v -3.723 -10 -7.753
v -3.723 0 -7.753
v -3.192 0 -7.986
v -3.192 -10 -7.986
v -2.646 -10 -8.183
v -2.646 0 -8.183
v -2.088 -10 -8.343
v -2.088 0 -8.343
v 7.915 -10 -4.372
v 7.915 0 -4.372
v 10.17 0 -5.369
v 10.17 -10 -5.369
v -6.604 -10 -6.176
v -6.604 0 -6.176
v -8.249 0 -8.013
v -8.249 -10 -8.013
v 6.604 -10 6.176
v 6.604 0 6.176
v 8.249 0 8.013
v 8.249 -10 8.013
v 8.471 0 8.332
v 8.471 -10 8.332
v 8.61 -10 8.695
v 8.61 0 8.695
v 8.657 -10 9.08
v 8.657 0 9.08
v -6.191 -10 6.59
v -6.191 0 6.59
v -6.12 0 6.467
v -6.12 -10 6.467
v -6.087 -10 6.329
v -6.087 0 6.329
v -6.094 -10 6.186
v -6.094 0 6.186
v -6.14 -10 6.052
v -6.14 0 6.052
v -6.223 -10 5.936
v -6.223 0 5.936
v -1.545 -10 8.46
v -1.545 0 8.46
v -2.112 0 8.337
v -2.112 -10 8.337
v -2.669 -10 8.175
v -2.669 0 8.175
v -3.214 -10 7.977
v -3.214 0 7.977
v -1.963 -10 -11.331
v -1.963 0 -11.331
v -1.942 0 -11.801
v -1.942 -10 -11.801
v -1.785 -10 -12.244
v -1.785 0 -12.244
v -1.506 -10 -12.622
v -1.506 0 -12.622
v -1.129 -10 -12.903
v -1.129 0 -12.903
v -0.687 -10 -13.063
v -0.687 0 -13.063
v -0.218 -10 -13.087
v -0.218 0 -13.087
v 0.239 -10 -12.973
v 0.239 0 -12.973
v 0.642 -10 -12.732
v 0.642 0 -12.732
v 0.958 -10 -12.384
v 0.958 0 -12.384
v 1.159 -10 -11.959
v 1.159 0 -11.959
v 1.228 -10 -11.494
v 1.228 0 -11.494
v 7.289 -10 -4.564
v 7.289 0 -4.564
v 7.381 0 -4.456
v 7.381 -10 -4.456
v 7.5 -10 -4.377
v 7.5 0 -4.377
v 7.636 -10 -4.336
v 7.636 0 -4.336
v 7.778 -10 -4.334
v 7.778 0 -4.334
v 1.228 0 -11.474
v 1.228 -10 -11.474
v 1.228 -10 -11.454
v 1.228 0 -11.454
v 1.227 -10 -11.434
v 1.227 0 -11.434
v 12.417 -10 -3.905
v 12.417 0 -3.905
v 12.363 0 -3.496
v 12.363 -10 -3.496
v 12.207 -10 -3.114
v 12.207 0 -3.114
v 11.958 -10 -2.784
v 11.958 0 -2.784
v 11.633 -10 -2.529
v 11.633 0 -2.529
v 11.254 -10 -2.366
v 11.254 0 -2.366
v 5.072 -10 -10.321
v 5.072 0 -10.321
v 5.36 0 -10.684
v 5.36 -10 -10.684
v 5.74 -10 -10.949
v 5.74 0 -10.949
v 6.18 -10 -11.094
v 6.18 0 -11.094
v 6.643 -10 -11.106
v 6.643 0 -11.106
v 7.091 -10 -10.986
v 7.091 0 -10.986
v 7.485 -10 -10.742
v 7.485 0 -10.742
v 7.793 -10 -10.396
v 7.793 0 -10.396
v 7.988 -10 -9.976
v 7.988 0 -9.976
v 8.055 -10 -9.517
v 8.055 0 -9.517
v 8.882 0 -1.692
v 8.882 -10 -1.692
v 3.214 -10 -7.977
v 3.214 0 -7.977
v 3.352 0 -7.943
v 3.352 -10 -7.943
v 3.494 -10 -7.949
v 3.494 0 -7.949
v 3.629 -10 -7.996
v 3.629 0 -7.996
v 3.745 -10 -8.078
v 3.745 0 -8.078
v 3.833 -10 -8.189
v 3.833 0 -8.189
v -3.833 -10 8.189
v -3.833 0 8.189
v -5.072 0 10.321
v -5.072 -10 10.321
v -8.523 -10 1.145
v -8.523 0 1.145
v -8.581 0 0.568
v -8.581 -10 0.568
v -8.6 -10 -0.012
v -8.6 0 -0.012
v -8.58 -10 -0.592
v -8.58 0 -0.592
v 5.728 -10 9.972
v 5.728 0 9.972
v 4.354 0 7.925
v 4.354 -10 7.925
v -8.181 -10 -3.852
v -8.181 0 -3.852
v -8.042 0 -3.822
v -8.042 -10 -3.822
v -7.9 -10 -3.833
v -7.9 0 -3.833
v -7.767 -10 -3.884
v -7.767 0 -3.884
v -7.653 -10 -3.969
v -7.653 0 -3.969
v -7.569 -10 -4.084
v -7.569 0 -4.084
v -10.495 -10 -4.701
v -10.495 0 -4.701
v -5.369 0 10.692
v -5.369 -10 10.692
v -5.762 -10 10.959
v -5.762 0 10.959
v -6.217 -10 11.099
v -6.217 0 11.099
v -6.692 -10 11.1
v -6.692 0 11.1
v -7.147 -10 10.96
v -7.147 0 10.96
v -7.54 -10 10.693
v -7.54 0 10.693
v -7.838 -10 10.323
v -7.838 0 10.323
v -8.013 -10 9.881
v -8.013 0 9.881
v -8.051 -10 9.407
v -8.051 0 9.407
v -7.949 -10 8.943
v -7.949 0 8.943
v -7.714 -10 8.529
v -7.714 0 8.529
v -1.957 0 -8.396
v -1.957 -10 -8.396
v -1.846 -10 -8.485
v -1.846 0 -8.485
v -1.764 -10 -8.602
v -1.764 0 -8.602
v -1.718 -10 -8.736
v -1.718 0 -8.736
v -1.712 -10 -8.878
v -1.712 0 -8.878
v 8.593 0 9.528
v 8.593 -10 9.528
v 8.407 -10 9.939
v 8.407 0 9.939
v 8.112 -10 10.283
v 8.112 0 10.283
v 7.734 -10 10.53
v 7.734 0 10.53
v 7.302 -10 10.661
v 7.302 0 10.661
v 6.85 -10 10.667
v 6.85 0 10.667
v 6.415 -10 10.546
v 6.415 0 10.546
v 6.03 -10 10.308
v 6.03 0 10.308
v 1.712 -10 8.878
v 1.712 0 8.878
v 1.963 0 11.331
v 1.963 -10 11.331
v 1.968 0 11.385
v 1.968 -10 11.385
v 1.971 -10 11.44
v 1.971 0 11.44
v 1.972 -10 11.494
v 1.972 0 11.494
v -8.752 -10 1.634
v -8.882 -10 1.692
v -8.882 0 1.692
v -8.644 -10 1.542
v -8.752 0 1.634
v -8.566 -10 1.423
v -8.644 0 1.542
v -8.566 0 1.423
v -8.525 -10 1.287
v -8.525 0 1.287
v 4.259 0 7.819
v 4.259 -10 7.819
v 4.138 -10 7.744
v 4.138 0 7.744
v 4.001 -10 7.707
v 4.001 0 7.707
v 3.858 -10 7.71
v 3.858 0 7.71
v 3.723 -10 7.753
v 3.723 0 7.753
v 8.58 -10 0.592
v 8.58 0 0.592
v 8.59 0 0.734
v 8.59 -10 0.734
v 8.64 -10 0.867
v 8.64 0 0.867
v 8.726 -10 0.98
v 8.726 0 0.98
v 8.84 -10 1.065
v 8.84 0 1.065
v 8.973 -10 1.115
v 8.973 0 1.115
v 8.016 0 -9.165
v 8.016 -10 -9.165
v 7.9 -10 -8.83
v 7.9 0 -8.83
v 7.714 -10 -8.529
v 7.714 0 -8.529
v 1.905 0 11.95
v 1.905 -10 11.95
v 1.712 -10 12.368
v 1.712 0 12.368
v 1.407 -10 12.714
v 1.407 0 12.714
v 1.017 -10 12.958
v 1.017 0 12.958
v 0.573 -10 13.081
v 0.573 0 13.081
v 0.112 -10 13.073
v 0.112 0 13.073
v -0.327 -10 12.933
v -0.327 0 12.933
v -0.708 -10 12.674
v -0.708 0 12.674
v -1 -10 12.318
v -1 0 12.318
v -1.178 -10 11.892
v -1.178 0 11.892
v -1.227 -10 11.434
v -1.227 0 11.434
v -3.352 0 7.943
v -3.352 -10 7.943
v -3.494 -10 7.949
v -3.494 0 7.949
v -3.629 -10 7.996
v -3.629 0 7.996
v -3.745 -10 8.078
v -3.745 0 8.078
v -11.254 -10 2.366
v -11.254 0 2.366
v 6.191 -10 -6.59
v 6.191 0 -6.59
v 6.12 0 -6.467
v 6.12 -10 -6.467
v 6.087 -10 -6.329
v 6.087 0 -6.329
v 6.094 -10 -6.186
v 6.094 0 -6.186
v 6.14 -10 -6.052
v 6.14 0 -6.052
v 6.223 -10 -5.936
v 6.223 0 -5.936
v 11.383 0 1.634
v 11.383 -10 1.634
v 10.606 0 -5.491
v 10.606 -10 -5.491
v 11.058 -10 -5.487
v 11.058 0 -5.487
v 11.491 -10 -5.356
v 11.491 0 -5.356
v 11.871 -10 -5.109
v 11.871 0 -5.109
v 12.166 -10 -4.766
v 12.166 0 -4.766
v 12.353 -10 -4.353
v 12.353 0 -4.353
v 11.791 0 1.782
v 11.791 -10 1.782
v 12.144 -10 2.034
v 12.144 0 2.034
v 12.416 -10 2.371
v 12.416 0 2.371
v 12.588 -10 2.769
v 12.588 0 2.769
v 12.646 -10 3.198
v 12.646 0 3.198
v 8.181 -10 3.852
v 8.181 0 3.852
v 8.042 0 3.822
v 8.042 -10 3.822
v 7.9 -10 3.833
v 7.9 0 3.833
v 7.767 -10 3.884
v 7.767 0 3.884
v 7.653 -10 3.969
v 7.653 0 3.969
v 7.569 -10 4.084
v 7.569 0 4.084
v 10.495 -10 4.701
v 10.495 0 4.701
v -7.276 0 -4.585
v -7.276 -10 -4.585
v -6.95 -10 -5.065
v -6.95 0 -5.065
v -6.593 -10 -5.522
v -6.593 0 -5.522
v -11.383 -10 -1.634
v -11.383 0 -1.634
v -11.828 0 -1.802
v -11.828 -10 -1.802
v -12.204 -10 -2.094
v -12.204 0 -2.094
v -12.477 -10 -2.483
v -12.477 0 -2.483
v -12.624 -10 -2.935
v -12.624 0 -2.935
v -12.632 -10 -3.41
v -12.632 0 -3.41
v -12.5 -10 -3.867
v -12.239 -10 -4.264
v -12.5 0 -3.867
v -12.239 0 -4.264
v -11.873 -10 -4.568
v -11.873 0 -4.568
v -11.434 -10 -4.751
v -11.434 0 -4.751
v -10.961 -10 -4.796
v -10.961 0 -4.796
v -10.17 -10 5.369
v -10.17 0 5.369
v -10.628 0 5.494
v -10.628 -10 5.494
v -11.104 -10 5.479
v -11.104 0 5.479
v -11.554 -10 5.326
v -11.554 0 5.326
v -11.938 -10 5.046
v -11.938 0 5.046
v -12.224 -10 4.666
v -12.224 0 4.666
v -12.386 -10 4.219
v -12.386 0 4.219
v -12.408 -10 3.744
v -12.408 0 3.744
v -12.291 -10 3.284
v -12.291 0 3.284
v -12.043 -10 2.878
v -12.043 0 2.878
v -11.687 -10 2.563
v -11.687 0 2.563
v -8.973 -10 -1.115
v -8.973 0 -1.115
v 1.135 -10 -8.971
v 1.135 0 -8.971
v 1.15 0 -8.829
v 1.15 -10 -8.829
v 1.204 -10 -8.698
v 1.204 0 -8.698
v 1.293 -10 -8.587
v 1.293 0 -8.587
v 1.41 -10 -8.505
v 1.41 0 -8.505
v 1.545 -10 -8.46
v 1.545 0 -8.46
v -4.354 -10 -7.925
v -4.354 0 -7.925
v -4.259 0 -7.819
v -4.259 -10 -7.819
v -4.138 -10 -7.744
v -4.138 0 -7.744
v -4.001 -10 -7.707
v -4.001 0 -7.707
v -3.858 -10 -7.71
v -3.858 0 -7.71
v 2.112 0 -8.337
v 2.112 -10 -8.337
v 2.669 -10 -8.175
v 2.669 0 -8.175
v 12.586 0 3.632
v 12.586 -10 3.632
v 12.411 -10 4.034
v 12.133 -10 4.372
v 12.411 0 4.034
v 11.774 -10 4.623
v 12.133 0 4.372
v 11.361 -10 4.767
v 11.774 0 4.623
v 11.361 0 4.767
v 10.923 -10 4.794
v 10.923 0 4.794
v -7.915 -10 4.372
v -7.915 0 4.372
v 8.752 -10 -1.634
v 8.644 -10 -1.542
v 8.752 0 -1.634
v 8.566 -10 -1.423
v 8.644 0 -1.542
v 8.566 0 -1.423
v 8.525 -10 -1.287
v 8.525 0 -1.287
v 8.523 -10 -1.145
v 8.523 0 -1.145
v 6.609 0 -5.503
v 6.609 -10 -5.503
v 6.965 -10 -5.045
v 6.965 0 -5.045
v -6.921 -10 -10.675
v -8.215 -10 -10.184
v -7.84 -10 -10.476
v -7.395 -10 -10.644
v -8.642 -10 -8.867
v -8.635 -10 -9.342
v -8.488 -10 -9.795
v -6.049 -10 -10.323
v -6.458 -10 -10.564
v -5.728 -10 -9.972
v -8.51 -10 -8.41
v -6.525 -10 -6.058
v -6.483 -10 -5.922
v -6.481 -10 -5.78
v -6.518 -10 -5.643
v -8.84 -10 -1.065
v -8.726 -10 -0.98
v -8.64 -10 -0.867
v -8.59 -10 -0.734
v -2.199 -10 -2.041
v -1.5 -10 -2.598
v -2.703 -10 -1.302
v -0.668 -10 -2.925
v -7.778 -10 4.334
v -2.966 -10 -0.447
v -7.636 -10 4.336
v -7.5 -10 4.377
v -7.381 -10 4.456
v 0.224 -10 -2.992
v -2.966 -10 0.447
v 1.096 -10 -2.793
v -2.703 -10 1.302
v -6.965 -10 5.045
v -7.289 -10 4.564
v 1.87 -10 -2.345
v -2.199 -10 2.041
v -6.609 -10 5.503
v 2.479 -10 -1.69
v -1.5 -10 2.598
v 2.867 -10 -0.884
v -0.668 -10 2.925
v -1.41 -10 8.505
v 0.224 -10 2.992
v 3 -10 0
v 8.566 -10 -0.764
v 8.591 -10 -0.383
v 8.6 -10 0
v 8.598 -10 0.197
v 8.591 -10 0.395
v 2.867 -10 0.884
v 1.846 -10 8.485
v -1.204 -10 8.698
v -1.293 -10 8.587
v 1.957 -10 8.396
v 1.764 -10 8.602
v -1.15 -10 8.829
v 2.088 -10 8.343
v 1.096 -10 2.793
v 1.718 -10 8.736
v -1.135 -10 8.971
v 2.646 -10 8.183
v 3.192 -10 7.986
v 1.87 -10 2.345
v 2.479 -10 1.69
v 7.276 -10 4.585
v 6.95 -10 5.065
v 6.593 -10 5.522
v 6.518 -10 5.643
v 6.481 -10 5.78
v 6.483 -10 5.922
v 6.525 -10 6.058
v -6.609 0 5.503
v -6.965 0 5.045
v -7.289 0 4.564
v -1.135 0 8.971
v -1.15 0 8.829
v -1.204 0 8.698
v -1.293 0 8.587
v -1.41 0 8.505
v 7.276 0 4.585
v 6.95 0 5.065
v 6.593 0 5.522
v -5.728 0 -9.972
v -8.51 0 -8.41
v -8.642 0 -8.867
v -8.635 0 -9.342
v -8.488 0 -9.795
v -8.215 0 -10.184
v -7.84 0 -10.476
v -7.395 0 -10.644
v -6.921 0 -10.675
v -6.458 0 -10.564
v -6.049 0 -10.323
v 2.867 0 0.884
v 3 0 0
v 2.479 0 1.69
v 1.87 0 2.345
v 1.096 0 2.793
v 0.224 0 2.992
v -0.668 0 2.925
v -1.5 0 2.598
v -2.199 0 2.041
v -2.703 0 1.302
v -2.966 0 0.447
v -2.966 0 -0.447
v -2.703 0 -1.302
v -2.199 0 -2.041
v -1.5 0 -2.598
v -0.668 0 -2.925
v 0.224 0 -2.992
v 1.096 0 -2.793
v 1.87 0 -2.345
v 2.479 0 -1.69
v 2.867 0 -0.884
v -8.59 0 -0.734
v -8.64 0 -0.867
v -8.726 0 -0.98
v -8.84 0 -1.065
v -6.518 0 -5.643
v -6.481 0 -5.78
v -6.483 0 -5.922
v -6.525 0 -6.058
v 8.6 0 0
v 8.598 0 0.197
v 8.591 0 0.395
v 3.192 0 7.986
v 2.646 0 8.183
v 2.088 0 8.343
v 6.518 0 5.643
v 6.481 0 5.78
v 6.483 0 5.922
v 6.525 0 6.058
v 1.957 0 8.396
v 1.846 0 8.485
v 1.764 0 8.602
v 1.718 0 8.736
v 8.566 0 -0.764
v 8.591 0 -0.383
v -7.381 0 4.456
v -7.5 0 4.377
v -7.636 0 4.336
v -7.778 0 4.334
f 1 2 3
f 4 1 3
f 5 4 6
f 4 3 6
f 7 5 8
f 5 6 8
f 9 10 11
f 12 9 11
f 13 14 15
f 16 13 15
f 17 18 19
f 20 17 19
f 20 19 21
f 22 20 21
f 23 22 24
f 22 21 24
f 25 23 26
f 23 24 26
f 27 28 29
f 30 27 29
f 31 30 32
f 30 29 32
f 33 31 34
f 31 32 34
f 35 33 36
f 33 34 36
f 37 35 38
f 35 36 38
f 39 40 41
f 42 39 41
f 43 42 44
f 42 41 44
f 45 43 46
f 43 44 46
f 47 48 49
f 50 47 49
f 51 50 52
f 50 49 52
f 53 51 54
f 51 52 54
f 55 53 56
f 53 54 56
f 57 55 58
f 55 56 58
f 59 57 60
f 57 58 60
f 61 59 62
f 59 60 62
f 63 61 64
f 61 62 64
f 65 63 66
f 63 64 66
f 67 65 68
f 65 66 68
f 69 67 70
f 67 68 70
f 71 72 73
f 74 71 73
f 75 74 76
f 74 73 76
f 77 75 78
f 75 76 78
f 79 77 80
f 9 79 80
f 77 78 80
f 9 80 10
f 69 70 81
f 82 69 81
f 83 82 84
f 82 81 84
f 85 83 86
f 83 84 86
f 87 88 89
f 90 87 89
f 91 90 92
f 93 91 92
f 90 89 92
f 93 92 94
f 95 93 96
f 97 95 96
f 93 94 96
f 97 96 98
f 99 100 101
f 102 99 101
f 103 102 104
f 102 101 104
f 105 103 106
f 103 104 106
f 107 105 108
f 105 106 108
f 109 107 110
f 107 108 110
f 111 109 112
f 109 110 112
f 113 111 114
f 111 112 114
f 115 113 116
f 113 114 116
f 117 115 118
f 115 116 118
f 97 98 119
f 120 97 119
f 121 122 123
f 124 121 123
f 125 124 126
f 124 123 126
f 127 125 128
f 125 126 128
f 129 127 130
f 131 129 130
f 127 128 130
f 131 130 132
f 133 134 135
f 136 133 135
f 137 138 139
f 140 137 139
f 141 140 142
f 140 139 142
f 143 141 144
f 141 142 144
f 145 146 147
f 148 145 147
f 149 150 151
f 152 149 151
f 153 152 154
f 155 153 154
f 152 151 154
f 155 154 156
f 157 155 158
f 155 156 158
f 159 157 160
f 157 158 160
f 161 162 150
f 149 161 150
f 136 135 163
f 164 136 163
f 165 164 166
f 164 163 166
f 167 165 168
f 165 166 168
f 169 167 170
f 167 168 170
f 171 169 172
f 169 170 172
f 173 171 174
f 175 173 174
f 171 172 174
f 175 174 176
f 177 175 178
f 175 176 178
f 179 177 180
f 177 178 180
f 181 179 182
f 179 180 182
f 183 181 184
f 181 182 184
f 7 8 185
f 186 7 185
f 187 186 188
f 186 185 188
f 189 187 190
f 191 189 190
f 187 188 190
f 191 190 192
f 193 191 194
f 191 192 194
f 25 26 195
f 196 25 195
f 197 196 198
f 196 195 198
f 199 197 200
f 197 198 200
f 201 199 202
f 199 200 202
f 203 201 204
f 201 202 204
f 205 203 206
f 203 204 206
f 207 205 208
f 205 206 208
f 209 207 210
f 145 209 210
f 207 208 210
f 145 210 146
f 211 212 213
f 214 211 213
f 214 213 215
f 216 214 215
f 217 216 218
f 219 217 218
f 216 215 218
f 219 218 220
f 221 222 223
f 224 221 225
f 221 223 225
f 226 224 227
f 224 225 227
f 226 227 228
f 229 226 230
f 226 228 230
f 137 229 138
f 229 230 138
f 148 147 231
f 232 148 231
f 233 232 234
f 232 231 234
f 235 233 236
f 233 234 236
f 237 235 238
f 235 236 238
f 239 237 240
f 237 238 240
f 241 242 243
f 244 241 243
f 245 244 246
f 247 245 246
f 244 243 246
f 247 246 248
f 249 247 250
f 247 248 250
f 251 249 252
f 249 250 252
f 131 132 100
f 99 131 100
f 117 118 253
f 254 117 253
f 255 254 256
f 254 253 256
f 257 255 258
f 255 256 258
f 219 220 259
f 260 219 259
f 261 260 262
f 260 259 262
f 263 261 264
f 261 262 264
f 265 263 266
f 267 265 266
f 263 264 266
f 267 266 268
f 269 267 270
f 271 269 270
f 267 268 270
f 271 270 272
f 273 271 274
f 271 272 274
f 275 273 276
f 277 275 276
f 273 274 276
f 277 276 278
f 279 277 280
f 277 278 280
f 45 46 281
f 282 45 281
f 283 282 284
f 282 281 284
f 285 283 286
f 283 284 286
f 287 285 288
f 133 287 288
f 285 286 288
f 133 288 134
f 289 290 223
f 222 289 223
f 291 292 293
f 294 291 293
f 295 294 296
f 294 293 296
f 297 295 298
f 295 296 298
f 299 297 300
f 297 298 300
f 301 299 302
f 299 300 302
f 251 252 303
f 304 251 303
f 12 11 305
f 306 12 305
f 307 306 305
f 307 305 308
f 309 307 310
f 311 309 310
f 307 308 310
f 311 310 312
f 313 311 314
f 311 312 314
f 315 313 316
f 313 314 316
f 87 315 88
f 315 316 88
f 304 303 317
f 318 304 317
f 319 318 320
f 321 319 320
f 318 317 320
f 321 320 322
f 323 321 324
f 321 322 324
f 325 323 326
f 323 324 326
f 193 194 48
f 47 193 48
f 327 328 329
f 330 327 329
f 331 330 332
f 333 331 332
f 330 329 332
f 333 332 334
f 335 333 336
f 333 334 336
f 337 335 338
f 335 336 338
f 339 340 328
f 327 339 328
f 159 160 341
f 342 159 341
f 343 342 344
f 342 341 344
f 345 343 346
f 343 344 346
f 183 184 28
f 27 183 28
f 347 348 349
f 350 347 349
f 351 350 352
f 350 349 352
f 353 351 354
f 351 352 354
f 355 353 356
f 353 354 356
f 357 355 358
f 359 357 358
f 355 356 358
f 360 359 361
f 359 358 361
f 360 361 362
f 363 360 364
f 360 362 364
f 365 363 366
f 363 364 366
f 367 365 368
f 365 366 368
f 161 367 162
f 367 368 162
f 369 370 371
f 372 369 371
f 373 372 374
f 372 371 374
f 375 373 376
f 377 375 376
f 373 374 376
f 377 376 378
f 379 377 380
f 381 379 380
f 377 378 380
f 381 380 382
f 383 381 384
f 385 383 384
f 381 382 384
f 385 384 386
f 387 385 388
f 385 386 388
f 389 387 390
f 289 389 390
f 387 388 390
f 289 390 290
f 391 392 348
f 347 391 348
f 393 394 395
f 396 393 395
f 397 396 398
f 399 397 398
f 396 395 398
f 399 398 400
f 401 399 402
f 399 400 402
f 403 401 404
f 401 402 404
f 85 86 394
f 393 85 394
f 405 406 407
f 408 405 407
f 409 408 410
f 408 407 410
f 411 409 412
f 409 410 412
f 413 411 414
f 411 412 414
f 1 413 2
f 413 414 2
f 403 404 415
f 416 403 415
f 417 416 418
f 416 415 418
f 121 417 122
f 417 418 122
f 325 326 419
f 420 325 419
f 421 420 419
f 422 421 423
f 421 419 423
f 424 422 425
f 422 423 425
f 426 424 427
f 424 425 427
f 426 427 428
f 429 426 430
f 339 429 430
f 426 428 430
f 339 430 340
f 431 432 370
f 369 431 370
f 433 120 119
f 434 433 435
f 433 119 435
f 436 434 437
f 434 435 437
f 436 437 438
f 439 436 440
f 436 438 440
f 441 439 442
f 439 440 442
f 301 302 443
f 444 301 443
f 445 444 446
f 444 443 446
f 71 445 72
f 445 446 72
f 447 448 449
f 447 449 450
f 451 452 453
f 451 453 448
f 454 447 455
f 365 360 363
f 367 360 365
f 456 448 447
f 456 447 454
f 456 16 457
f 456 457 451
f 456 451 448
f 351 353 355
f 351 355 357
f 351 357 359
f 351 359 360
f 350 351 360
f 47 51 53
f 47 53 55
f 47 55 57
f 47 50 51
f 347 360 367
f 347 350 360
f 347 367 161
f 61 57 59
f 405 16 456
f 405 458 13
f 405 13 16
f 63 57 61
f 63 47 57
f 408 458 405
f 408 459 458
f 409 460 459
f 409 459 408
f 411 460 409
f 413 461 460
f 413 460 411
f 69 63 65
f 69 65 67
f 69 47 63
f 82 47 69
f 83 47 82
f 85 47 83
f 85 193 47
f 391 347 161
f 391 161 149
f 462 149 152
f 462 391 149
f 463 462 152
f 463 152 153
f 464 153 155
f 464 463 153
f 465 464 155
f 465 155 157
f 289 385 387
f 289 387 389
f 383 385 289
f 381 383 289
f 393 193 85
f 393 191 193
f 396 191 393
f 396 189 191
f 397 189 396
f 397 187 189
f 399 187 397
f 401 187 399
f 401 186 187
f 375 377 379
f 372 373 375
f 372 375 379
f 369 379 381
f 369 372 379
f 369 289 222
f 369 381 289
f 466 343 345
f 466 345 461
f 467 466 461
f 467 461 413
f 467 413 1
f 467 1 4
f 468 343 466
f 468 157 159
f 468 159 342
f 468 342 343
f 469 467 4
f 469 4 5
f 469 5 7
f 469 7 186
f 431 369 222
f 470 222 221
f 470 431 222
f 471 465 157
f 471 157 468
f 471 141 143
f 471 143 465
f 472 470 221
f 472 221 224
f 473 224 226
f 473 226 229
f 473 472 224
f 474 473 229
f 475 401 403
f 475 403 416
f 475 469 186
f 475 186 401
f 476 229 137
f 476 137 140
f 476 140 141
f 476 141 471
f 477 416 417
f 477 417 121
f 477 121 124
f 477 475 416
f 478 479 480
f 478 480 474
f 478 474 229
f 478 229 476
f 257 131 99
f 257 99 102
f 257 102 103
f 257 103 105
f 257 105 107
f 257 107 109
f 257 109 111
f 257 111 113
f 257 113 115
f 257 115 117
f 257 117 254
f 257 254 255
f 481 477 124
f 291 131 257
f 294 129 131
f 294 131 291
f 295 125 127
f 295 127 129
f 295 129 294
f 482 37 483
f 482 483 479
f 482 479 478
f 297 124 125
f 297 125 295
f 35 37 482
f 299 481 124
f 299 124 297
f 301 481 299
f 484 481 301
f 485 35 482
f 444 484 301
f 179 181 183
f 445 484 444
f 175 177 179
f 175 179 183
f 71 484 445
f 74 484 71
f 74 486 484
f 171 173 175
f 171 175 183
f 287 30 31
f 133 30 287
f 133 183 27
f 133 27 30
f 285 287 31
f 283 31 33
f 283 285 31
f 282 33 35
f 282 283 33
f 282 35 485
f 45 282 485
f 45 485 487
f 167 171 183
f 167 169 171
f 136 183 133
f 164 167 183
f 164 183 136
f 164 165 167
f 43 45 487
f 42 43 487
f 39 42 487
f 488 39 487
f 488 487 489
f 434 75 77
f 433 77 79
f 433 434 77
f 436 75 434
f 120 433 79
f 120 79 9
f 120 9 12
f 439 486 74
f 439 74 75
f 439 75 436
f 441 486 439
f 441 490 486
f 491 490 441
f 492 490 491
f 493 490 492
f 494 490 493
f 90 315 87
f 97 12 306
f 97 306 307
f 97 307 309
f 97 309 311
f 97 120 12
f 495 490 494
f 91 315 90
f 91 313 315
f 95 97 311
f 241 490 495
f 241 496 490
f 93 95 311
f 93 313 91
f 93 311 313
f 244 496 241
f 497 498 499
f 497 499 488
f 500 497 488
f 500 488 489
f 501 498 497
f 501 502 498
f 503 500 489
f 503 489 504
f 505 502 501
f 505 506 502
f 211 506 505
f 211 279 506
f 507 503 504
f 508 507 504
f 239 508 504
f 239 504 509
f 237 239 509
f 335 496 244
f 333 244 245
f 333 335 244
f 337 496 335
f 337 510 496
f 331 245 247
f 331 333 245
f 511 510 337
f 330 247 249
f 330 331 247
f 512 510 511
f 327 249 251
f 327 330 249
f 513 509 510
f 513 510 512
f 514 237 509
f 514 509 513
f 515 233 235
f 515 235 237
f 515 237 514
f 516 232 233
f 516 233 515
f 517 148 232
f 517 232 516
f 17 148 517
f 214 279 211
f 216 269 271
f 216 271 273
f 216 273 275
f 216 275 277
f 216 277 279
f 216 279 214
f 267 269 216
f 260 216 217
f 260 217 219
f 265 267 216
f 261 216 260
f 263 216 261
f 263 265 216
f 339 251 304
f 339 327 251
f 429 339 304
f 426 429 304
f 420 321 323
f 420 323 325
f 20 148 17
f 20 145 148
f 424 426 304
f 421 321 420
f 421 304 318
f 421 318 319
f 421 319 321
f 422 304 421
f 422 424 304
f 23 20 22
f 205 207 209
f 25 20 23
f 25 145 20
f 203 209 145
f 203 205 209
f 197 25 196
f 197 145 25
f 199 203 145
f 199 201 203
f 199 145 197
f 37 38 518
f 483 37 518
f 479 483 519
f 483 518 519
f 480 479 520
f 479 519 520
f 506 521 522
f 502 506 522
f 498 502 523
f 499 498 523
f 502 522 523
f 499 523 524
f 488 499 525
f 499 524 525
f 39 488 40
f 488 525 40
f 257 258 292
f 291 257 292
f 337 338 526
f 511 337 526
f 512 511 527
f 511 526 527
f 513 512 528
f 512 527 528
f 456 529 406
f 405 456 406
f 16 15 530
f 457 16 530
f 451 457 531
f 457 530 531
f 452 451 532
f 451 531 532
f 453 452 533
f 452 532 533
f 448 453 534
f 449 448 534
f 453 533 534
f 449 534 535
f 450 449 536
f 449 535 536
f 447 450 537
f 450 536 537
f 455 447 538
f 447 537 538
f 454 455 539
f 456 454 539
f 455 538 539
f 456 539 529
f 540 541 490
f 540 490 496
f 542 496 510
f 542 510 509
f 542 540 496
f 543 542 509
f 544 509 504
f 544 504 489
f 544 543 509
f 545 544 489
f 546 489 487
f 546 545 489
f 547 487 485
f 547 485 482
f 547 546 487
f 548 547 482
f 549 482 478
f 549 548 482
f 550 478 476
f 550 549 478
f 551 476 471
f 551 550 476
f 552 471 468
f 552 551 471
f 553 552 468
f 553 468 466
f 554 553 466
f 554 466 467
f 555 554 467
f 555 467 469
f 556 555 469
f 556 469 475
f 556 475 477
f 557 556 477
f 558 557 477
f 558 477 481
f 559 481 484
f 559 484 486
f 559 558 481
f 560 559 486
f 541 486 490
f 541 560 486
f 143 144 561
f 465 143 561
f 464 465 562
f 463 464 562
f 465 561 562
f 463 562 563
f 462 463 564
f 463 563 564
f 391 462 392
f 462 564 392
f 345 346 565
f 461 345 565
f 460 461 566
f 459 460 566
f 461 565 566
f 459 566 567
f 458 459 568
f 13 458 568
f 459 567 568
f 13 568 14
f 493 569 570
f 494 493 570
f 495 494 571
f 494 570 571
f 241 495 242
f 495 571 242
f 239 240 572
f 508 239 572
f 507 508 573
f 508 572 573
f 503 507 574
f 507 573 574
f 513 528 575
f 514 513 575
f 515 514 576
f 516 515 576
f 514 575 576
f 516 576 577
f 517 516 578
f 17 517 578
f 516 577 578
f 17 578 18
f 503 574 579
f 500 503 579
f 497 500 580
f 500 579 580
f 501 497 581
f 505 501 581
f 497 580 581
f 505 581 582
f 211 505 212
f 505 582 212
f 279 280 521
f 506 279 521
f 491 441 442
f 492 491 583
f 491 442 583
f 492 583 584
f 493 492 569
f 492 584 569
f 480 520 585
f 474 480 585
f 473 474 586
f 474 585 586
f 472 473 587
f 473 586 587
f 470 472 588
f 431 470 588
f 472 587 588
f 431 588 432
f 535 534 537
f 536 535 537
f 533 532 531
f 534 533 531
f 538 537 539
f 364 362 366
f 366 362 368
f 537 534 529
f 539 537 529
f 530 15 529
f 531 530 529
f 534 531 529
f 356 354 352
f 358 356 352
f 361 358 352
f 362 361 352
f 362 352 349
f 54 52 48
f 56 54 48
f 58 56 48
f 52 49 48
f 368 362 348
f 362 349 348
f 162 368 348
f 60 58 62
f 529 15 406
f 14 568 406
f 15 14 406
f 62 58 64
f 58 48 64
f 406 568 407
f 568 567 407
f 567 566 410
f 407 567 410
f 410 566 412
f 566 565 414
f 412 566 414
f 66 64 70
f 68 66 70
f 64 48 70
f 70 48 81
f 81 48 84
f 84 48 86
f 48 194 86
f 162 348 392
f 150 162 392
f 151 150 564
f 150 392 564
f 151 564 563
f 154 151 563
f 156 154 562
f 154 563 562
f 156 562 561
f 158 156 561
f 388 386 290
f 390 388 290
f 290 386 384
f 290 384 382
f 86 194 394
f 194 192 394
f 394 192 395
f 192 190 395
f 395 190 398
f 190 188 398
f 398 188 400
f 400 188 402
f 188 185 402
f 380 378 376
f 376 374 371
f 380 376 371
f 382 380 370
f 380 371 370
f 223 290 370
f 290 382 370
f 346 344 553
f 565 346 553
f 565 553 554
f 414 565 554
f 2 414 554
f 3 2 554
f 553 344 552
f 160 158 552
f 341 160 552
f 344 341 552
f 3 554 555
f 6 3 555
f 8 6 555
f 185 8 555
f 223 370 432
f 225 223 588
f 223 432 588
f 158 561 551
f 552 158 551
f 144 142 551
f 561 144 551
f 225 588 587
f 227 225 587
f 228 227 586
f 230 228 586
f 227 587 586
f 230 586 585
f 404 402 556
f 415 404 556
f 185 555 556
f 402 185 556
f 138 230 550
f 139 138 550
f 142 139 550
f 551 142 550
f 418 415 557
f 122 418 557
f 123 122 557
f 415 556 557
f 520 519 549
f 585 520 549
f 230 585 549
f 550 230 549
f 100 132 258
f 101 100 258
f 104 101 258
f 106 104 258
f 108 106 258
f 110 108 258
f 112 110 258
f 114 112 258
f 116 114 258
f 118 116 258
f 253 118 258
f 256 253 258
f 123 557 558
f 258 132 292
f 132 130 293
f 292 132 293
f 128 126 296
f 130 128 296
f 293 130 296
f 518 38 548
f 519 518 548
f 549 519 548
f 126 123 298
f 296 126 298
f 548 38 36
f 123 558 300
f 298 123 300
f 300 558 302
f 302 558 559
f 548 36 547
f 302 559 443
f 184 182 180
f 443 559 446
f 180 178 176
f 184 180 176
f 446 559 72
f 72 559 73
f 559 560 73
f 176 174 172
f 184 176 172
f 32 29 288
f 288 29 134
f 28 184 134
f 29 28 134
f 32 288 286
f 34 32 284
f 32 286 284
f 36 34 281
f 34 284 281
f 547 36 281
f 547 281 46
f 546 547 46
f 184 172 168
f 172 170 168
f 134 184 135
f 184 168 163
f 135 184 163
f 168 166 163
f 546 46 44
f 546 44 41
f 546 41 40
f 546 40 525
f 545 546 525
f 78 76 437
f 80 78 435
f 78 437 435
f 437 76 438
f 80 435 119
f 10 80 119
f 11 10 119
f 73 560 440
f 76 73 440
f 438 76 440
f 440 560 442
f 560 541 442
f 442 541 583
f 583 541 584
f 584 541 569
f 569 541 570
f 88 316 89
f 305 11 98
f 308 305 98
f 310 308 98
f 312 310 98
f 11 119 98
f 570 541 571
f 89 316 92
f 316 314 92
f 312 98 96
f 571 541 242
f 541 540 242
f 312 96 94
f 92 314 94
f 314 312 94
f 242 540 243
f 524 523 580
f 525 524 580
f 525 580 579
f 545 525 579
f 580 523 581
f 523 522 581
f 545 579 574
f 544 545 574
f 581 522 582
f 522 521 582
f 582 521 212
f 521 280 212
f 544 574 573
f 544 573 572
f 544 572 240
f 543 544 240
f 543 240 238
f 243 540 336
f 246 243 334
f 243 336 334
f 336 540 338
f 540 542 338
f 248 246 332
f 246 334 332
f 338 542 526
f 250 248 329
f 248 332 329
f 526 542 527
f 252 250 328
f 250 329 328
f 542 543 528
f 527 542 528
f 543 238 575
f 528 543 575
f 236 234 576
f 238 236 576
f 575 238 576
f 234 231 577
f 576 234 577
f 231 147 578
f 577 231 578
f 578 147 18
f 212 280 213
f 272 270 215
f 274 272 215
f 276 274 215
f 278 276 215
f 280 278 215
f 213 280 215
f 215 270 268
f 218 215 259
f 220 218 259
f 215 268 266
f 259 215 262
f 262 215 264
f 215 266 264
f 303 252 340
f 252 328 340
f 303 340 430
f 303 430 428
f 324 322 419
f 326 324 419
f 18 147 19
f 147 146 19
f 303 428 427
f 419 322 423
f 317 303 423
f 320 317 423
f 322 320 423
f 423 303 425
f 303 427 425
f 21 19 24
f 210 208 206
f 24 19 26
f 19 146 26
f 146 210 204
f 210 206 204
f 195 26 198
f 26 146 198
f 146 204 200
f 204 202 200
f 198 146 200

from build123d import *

# Parameters (mm, degrees)
F0_R     = 3
F1_DEPTH = 10


with BuildPart() as f1:
    # F0 (on Front) → F1 (new body)
    with BuildSketch(Plane.XZ):
        with BuildLine():
            ThreePointArc((8.523458, -1.144846), (8.580843, -0.573701), (8.6, 0))
            ThreePointArc((8.6, 0), (8.594903, 0.296051), (8.579617, 0.59175))
            ThreePointArc((8.579617, 0.59175), (8.26071, 2.391793), (7.568545, 4.083763))
            ThreePointArc((7.568545, 4.083763), (7.117297, 4.82743), (6.593234, 5.521708))
            ThreePointArc((6.593234, 5.521708), (5.277194, 6.790524), (3.722706, 7.752513))
            ThreePointArc((3.722706, 7.752513), (2.920522, 8.088915), (2.08846, 8.342562))
            ThreePointArc((2.08846, 8.342562), (0.27797, 8.595507), (-1.54508, 8.460067))
            ThreePointArc((-1.54508, 8.460067), (-2.391793, 8.26071), (-3.214035, 7.97684))
            ThreePointArc((-3.214035, 7.97684), (-4.82743, 7.117297), (-6.222699, 5.936162))
            ThreePointArc((-6.222699, 5.936162), (-6.790524, 5.277194), (-7.288878, 4.564237))
            ThreePointArc((-7.288878, 4.564237), (-8.088915, 2.920522), (-8.523458, 1.144846))
            ThreePointArc((-8.523458, 1.144846), (-8.595507, 0.27797), (-8.579617, -0.59175))
            ThreePointArc((-8.579617, -0.59175), (-8.26071, -2.391793), (-7.568545, -4.083763))
            ThreePointArc((-7.568545, -4.083763), (-7.117297, -4.82743), (-6.593234, -5.521708))
            ThreePointArc((-6.593234, -5.521708), (-5.277194, -6.790524), (-3.722706, -7.752513))
            ThreePointArc((-3.722706, -7.752513), (-2.920522, -8.088915), (-2.08846, -8.342562))
            ThreePointArc((-2.08846, -8.342562), (-0.27797, -8.595507), (1.54508, -8.460067))
            ThreePointArc((1.54508, -8.460067), (2.391793, -8.26071), (3.214035, -7.97684))
            ThreePointArc((3.214035, -7.97684), (4.82743, -7.117297), (6.222699, -5.936162))
            ThreePointArc((6.222699, -5.936162), (6.790524, -5.277194), (7.288878, -4.564237))
            ThreePointArc((7.288878, -4.564237), (8.088915, -2.920522), (8.523458, -1.144846))
        make_face()
        Circle(F0_R, mode=Mode.SUBTRACT)
        with BuildLine():
            ThreePointArc((7.568545, 4.083763), (8.26071, 2.391793), (8.579617, 0.59175))
            ThreePointArc((8.579617, 0.59175), (8.678841, 0.926698), (8.973122, 1.114938))
            Line((8.973122, 1.114938), (11.383292, 1.634219))
            ThreePointArc((11.383292, 1.634219), (9.509422, 2.753343), (10.495478, 4.700525))
            Line((10.495478, 4.700525), (8.180708, 3.851754))
            ThreePointArc((8.180708, 3.851754), (7.831378, 3.853644), (7.568545, 4.083763))
        make_face()
        with BuildLine():
            ThreePointArc((8.882336, -1.692365), (8.600833, -1.485505), (8.523458, -1.144846))
            ThreePointArc((8.523458, -1.144846), (8.088915, -2.920522), (7.288878, -4.564237))
            ThreePointArc((7.288878, -4.564237), (7.566029, -4.35158), (7.914752, -4.372265))
            Line((7.914752, -4.372265), (10.169846, -5.36882))
            ThreePointArc((10.169846, -5.36882), (9.311658, -3.361997), (11.25392, -2.366283))
            Line((11.25392, -2.366283), (8.882336, -1.692365))
        make_face()
        with BuildLine():
            ThreePointArc((3.722706, 7.752513), (5.277194, 6.790524), (6.593234, 5.521708))
            ThreePointArc((6.593234, 5.521708), (6.47663, 5.851009), (6.604064, 6.176272))
            Line((6.604064, 6.176272), (8.248707, 8.013042))
            ThreePointArc((8.248707, 8.013042), (6.07491, 7.816999), (5.728121, 9.971892))
            Line((5.728121, 9.971892), (4.354328, 7.924634))
            ThreePointArc((4.354328, 7.924634), (4.070602, 7.720832), (3.722706, 7.752513))
        make_face()
        with BuildLine():
            ThreePointArc((10.495478, 4.700525), (9.509422, 2.753343), (11.383292, 1.634219))
            ThreePointArc((11.383292, 1.634219), (12.291125, 2.193138), (12.646298, 3.198328))
            ThreePointArc((12.646298, 3.198328), (11.962455, 4.510065), (10.495478, 4.700525))
        make_face()
        with BuildLine():
            ThreePointArc((6.191214, -6.590058), (6.085062, -6.257241), (6.222699, -5.936162))
            ThreePointArc((6.222699, -5.936162), (4.82743, -7.117297), (3.214035, -7.97684))
            ThreePointArc((3.214035, -7.97684), (3.563252, -7.967703), (3.833216, -8.189411))
            Line((3.833216, -8.189411), (5.071865, -10.321152))
            ThreePointArc((5.071865, -10.321152), (5.557158, -8.193168), (7.713746, -8.529251))
            Line((7.713746, -8.529251), (6.191214, -6.590058))
        make_face()
        with BuildLine():
            ThreePointArc((12.416573, -3.90535), (12.093239, -2.940921), (11.25392, -2.366283))
            ThreePointArc((11.25392, -2.366283), (9.311658, -3.361997), (10.169846, -5.36882))
            ThreePointArc((10.169846, -5.36882), (11.689853, -5.246014), (12.416573, -3.90535))
        make_face()
        with BuildLine():
            ThreePointArc((-1.54508, 8.460067), (0.27797, 8.595507), (2.08846, 8.342562))
            ThreePointArc((2.08846, 8.342562), (1.800567, 8.540434), (1.712478, 8.878481))
            Line((1.712478, 8.878481), (1.963396, 11.331155))
            ThreePointArc((1.963396, 11.331155), (0.319988, 9.894827), (-1.227184, 11.434335))
            Line((-1.227184, 11.434335), (-1.135258, 8.970573))
            ThreePointArc((-1.135258, 8.970573), (-1.245005, 8.638924), (-1.54508, 8.460067))
        make_face()
        with BuildLine():
            ThreePointArc((5.728121, 9.971892), (6.07491, 7.816999), (8.248707, 8.013042))
            ThreePointArc((8.248707, 8.013042), (8.551235, 8.509034), (8.656713, 9.080352))
            ThreePointArc((8.656713, 9.080352), (7.522681, 10.610997), (5.728121, 9.971892))
        make_face()
        with BuildLine():
            ThreePointArc((1.135258, -8.970573), (1.245005, -8.638924), (1.54508, -8.460067))
            ThreePointArc((1.54508, -8.460067), (-0.27797, -8.595507), (-2.08846, -8.342562))
            ThreePointArc((-2.08846, -8.342562), (-1.800567, -8.540434), (-1.712478, -8.878481))
            Line((-1.712478, -8.878481), (-1.963396, -11.331155))
            ThreePointArc((-1.963396, -11.331155), (-0.319988, -9.894827), (1.227184, -11.434335))
            Line((1.227184, -11.434335), (1.135258, -8.970573))
        make_face()
        with BuildLine():
            ThreePointArc((8.055284, -9.517316), (7.967491, -8.994602), (7.713746, -8.529251))
            ThreePointArc((7.713746, -8.529251), (5.557158, -8.193168), (5.071865, -10.321152))
            ThreePointArc((5.071865, -10.321152), (6.871535, -11.062222), (8.055284, -9.517316))
        make_face()
        with BuildLine():
            ThreePointArc((-6.222699, 5.936162), (-4.82743, 7.117297), (-3.214035, 7.97684))
            ThreePointArc((-3.214035, 7.97684), (-3.563252, 7.967703), (-3.833216, 8.189411))
            Line((-3.833216, 8.189411), (-5.071865, 10.321152))
            ThreePointArc((-5.071865, 10.321152), (-4.910378, 9.933567), (-4.855284, 9.517316))
            ThreePointArc((-4.855284, 9.517316), (-5.93257, 8.005109), (-7.713746, 8.529251))
            Line((-7.713746, 8.529251), (-6.191214, 6.590058))
            ThreePointArc((-6.191214, 6.590058), (-6.085062, 6.257241), (-6.222699, 5.936162))
        make_face()
        with BuildLine():
            ThreePointArc((-1.227184, 11.434335), (0.319988, 9.894827), (1.963396, 11.331155))
            ThreePointArc((1.963396, 11.331155), (1.969625, 11.412467), (1.971704, 11.493991))
            ThreePointArc((1.971704, 11.493991), (0.34187, 13.093713), (-1.227184, 11.434335))
        make_face()
        with BuildLine():
            ThreePointArc((-4.354328, -7.924634), (-4.070602, -7.720832), (-3.722706, -7.752513))
            ThreePointArc((-3.722706, -7.752513), (-5.277194, -6.790524), (-6.593234, -5.521708))
            ThreePointArc((-6.593234, -5.521708), (-6.47663, -5.851009), (-6.604064, -6.176272))
            Line((-6.604064, -6.176272), (-8.248707, -8.013042))
            ThreePointArc((-8.248707, -8.013042), (-6.485394, -7.585831), (-5.456713, -9.080352))
            ThreePointArc((-5.456713, -9.080352), (-5.526068, -9.546321), (-5.728121, -9.971892))
            Line((-5.728121, -9.971892), (-4.354328, -7.924634))
        make_face()
        with BuildLine():
            ThreePointArc((1.228296, -11.493991), (1.228018, -11.464158), (1.227184, -11.434335))
            ThreePointArc((1.227184, -11.434335), (-0.319988, -9.894827), (-1.963396, -11.331155))
            ThreePointArc((-1.963396, -11.331155), (-0.453228, -13.091913), (1.228296, -11.493991))
        make_face()
        with BuildLine():
            ThreePointArc((-8.523458, 1.144846), (-8.088915, 2.920522), (-7.288878, 4.564237))
            ThreePointArc((-7.288878, 4.564237), (-7.566029, 4.35158), (-7.914752, 4.372265))
            Line((-7.914752, 4.372265), (-10.169846, 5.36882))
            ThreePointArc((-10.169846, 5.36882), (-9.475908, 4.77863), (-9.216573, 3.90535))
            ThreePointArc((-9.216573, 3.90535), (-9.852144, 2.628683), (-11.25392, 2.366283))
            Line((-11.25392, 2.366283), (-8.882336, 1.692365))
            ThreePointArc((-8.882336, 1.692365), (-8.600833, 1.485505), (-8.523458, 1.144846))
        make_face()
        with BuildLine():
            ThreePointArc((-4.855284, 9.517316), (-4.910378, 9.933567), (-5.071865, 10.321152))
            ThreePointArc((-5.071865, 10.321152), (-7.353411, 10.841465), (-7.713746, 8.529251))
            ThreePointArc((-7.713746, 8.529251), (-5.93257, 8.005109), (-4.855284, 9.517316))
        make_face()
        with BuildLine():
            ThreePointArc((-8.180708, -3.851754), (-7.831378, -3.853644), (-7.568545, -4.083763))
            ThreePointArc((-7.568545, -4.083763), (-8.26071, -2.391793), (-8.579617, -0.59175))
            ThreePointArc((-8.579617, -0.59175), (-8.678841, -0.926698), (-8.973122, -1.114938))
            Line((-8.973122, -1.114938), (-11.383292, -1.634219))
            ThreePointArc((-11.383292, -1.634219), (-10.041109, -1.9535), (-9.446298, -3.198328))
            ThreePointArc((-9.446298, -3.198328), (-9.73456, -4.114485), (-10.495478, -4.700525))
            Line((-10.495478, -4.700525), (-8.180708, -3.851754))
        make_face()
        with BuildLine():
            ThreePointArc((-8.248707, -8.013042), (-8.038517, -10.343706), (-5.728121, -9.971892))
            ThreePointArc((-5.728121, -9.971892), (-5.526068, -9.546321), (-5.456713, -9.080352))
            ThreePointArc((-5.456713, -9.080352), (-6.485394, -7.585831), (-8.248707, -8.013042))
        make_face()
        with BuildLine():
            ThreePointArc((-9.216573, 3.90535), (-9.475908, 4.77863), (-10.169846, 5.36882))
            ThreePointArc((-10.169846, 5.36882), (-12.321487, 4.448703), (-11.25392, 2.366283))
            ThreePointArc((-11.25392, 2.366283), (-9.852144, 2.628683), (-9.216573, 3.90535))
        make_face()
        with BuildLine():
            ThreePointArc((-11.383292, -1.634219), (-12.583174, -3.643312), (-10.495478, -4.700525))
            ThreePointArc((-10.495478, -4.700525), (-9.73456, -4.114485), (-9.446298, -3.198328))
            ThreePointArc((-9.446298, -3.198328), (-10.041109, -1.9535), (-11.383292, -1.634219))
        make_face()
    extrude(amount=F1_DEPTH)


solid = f1.part
